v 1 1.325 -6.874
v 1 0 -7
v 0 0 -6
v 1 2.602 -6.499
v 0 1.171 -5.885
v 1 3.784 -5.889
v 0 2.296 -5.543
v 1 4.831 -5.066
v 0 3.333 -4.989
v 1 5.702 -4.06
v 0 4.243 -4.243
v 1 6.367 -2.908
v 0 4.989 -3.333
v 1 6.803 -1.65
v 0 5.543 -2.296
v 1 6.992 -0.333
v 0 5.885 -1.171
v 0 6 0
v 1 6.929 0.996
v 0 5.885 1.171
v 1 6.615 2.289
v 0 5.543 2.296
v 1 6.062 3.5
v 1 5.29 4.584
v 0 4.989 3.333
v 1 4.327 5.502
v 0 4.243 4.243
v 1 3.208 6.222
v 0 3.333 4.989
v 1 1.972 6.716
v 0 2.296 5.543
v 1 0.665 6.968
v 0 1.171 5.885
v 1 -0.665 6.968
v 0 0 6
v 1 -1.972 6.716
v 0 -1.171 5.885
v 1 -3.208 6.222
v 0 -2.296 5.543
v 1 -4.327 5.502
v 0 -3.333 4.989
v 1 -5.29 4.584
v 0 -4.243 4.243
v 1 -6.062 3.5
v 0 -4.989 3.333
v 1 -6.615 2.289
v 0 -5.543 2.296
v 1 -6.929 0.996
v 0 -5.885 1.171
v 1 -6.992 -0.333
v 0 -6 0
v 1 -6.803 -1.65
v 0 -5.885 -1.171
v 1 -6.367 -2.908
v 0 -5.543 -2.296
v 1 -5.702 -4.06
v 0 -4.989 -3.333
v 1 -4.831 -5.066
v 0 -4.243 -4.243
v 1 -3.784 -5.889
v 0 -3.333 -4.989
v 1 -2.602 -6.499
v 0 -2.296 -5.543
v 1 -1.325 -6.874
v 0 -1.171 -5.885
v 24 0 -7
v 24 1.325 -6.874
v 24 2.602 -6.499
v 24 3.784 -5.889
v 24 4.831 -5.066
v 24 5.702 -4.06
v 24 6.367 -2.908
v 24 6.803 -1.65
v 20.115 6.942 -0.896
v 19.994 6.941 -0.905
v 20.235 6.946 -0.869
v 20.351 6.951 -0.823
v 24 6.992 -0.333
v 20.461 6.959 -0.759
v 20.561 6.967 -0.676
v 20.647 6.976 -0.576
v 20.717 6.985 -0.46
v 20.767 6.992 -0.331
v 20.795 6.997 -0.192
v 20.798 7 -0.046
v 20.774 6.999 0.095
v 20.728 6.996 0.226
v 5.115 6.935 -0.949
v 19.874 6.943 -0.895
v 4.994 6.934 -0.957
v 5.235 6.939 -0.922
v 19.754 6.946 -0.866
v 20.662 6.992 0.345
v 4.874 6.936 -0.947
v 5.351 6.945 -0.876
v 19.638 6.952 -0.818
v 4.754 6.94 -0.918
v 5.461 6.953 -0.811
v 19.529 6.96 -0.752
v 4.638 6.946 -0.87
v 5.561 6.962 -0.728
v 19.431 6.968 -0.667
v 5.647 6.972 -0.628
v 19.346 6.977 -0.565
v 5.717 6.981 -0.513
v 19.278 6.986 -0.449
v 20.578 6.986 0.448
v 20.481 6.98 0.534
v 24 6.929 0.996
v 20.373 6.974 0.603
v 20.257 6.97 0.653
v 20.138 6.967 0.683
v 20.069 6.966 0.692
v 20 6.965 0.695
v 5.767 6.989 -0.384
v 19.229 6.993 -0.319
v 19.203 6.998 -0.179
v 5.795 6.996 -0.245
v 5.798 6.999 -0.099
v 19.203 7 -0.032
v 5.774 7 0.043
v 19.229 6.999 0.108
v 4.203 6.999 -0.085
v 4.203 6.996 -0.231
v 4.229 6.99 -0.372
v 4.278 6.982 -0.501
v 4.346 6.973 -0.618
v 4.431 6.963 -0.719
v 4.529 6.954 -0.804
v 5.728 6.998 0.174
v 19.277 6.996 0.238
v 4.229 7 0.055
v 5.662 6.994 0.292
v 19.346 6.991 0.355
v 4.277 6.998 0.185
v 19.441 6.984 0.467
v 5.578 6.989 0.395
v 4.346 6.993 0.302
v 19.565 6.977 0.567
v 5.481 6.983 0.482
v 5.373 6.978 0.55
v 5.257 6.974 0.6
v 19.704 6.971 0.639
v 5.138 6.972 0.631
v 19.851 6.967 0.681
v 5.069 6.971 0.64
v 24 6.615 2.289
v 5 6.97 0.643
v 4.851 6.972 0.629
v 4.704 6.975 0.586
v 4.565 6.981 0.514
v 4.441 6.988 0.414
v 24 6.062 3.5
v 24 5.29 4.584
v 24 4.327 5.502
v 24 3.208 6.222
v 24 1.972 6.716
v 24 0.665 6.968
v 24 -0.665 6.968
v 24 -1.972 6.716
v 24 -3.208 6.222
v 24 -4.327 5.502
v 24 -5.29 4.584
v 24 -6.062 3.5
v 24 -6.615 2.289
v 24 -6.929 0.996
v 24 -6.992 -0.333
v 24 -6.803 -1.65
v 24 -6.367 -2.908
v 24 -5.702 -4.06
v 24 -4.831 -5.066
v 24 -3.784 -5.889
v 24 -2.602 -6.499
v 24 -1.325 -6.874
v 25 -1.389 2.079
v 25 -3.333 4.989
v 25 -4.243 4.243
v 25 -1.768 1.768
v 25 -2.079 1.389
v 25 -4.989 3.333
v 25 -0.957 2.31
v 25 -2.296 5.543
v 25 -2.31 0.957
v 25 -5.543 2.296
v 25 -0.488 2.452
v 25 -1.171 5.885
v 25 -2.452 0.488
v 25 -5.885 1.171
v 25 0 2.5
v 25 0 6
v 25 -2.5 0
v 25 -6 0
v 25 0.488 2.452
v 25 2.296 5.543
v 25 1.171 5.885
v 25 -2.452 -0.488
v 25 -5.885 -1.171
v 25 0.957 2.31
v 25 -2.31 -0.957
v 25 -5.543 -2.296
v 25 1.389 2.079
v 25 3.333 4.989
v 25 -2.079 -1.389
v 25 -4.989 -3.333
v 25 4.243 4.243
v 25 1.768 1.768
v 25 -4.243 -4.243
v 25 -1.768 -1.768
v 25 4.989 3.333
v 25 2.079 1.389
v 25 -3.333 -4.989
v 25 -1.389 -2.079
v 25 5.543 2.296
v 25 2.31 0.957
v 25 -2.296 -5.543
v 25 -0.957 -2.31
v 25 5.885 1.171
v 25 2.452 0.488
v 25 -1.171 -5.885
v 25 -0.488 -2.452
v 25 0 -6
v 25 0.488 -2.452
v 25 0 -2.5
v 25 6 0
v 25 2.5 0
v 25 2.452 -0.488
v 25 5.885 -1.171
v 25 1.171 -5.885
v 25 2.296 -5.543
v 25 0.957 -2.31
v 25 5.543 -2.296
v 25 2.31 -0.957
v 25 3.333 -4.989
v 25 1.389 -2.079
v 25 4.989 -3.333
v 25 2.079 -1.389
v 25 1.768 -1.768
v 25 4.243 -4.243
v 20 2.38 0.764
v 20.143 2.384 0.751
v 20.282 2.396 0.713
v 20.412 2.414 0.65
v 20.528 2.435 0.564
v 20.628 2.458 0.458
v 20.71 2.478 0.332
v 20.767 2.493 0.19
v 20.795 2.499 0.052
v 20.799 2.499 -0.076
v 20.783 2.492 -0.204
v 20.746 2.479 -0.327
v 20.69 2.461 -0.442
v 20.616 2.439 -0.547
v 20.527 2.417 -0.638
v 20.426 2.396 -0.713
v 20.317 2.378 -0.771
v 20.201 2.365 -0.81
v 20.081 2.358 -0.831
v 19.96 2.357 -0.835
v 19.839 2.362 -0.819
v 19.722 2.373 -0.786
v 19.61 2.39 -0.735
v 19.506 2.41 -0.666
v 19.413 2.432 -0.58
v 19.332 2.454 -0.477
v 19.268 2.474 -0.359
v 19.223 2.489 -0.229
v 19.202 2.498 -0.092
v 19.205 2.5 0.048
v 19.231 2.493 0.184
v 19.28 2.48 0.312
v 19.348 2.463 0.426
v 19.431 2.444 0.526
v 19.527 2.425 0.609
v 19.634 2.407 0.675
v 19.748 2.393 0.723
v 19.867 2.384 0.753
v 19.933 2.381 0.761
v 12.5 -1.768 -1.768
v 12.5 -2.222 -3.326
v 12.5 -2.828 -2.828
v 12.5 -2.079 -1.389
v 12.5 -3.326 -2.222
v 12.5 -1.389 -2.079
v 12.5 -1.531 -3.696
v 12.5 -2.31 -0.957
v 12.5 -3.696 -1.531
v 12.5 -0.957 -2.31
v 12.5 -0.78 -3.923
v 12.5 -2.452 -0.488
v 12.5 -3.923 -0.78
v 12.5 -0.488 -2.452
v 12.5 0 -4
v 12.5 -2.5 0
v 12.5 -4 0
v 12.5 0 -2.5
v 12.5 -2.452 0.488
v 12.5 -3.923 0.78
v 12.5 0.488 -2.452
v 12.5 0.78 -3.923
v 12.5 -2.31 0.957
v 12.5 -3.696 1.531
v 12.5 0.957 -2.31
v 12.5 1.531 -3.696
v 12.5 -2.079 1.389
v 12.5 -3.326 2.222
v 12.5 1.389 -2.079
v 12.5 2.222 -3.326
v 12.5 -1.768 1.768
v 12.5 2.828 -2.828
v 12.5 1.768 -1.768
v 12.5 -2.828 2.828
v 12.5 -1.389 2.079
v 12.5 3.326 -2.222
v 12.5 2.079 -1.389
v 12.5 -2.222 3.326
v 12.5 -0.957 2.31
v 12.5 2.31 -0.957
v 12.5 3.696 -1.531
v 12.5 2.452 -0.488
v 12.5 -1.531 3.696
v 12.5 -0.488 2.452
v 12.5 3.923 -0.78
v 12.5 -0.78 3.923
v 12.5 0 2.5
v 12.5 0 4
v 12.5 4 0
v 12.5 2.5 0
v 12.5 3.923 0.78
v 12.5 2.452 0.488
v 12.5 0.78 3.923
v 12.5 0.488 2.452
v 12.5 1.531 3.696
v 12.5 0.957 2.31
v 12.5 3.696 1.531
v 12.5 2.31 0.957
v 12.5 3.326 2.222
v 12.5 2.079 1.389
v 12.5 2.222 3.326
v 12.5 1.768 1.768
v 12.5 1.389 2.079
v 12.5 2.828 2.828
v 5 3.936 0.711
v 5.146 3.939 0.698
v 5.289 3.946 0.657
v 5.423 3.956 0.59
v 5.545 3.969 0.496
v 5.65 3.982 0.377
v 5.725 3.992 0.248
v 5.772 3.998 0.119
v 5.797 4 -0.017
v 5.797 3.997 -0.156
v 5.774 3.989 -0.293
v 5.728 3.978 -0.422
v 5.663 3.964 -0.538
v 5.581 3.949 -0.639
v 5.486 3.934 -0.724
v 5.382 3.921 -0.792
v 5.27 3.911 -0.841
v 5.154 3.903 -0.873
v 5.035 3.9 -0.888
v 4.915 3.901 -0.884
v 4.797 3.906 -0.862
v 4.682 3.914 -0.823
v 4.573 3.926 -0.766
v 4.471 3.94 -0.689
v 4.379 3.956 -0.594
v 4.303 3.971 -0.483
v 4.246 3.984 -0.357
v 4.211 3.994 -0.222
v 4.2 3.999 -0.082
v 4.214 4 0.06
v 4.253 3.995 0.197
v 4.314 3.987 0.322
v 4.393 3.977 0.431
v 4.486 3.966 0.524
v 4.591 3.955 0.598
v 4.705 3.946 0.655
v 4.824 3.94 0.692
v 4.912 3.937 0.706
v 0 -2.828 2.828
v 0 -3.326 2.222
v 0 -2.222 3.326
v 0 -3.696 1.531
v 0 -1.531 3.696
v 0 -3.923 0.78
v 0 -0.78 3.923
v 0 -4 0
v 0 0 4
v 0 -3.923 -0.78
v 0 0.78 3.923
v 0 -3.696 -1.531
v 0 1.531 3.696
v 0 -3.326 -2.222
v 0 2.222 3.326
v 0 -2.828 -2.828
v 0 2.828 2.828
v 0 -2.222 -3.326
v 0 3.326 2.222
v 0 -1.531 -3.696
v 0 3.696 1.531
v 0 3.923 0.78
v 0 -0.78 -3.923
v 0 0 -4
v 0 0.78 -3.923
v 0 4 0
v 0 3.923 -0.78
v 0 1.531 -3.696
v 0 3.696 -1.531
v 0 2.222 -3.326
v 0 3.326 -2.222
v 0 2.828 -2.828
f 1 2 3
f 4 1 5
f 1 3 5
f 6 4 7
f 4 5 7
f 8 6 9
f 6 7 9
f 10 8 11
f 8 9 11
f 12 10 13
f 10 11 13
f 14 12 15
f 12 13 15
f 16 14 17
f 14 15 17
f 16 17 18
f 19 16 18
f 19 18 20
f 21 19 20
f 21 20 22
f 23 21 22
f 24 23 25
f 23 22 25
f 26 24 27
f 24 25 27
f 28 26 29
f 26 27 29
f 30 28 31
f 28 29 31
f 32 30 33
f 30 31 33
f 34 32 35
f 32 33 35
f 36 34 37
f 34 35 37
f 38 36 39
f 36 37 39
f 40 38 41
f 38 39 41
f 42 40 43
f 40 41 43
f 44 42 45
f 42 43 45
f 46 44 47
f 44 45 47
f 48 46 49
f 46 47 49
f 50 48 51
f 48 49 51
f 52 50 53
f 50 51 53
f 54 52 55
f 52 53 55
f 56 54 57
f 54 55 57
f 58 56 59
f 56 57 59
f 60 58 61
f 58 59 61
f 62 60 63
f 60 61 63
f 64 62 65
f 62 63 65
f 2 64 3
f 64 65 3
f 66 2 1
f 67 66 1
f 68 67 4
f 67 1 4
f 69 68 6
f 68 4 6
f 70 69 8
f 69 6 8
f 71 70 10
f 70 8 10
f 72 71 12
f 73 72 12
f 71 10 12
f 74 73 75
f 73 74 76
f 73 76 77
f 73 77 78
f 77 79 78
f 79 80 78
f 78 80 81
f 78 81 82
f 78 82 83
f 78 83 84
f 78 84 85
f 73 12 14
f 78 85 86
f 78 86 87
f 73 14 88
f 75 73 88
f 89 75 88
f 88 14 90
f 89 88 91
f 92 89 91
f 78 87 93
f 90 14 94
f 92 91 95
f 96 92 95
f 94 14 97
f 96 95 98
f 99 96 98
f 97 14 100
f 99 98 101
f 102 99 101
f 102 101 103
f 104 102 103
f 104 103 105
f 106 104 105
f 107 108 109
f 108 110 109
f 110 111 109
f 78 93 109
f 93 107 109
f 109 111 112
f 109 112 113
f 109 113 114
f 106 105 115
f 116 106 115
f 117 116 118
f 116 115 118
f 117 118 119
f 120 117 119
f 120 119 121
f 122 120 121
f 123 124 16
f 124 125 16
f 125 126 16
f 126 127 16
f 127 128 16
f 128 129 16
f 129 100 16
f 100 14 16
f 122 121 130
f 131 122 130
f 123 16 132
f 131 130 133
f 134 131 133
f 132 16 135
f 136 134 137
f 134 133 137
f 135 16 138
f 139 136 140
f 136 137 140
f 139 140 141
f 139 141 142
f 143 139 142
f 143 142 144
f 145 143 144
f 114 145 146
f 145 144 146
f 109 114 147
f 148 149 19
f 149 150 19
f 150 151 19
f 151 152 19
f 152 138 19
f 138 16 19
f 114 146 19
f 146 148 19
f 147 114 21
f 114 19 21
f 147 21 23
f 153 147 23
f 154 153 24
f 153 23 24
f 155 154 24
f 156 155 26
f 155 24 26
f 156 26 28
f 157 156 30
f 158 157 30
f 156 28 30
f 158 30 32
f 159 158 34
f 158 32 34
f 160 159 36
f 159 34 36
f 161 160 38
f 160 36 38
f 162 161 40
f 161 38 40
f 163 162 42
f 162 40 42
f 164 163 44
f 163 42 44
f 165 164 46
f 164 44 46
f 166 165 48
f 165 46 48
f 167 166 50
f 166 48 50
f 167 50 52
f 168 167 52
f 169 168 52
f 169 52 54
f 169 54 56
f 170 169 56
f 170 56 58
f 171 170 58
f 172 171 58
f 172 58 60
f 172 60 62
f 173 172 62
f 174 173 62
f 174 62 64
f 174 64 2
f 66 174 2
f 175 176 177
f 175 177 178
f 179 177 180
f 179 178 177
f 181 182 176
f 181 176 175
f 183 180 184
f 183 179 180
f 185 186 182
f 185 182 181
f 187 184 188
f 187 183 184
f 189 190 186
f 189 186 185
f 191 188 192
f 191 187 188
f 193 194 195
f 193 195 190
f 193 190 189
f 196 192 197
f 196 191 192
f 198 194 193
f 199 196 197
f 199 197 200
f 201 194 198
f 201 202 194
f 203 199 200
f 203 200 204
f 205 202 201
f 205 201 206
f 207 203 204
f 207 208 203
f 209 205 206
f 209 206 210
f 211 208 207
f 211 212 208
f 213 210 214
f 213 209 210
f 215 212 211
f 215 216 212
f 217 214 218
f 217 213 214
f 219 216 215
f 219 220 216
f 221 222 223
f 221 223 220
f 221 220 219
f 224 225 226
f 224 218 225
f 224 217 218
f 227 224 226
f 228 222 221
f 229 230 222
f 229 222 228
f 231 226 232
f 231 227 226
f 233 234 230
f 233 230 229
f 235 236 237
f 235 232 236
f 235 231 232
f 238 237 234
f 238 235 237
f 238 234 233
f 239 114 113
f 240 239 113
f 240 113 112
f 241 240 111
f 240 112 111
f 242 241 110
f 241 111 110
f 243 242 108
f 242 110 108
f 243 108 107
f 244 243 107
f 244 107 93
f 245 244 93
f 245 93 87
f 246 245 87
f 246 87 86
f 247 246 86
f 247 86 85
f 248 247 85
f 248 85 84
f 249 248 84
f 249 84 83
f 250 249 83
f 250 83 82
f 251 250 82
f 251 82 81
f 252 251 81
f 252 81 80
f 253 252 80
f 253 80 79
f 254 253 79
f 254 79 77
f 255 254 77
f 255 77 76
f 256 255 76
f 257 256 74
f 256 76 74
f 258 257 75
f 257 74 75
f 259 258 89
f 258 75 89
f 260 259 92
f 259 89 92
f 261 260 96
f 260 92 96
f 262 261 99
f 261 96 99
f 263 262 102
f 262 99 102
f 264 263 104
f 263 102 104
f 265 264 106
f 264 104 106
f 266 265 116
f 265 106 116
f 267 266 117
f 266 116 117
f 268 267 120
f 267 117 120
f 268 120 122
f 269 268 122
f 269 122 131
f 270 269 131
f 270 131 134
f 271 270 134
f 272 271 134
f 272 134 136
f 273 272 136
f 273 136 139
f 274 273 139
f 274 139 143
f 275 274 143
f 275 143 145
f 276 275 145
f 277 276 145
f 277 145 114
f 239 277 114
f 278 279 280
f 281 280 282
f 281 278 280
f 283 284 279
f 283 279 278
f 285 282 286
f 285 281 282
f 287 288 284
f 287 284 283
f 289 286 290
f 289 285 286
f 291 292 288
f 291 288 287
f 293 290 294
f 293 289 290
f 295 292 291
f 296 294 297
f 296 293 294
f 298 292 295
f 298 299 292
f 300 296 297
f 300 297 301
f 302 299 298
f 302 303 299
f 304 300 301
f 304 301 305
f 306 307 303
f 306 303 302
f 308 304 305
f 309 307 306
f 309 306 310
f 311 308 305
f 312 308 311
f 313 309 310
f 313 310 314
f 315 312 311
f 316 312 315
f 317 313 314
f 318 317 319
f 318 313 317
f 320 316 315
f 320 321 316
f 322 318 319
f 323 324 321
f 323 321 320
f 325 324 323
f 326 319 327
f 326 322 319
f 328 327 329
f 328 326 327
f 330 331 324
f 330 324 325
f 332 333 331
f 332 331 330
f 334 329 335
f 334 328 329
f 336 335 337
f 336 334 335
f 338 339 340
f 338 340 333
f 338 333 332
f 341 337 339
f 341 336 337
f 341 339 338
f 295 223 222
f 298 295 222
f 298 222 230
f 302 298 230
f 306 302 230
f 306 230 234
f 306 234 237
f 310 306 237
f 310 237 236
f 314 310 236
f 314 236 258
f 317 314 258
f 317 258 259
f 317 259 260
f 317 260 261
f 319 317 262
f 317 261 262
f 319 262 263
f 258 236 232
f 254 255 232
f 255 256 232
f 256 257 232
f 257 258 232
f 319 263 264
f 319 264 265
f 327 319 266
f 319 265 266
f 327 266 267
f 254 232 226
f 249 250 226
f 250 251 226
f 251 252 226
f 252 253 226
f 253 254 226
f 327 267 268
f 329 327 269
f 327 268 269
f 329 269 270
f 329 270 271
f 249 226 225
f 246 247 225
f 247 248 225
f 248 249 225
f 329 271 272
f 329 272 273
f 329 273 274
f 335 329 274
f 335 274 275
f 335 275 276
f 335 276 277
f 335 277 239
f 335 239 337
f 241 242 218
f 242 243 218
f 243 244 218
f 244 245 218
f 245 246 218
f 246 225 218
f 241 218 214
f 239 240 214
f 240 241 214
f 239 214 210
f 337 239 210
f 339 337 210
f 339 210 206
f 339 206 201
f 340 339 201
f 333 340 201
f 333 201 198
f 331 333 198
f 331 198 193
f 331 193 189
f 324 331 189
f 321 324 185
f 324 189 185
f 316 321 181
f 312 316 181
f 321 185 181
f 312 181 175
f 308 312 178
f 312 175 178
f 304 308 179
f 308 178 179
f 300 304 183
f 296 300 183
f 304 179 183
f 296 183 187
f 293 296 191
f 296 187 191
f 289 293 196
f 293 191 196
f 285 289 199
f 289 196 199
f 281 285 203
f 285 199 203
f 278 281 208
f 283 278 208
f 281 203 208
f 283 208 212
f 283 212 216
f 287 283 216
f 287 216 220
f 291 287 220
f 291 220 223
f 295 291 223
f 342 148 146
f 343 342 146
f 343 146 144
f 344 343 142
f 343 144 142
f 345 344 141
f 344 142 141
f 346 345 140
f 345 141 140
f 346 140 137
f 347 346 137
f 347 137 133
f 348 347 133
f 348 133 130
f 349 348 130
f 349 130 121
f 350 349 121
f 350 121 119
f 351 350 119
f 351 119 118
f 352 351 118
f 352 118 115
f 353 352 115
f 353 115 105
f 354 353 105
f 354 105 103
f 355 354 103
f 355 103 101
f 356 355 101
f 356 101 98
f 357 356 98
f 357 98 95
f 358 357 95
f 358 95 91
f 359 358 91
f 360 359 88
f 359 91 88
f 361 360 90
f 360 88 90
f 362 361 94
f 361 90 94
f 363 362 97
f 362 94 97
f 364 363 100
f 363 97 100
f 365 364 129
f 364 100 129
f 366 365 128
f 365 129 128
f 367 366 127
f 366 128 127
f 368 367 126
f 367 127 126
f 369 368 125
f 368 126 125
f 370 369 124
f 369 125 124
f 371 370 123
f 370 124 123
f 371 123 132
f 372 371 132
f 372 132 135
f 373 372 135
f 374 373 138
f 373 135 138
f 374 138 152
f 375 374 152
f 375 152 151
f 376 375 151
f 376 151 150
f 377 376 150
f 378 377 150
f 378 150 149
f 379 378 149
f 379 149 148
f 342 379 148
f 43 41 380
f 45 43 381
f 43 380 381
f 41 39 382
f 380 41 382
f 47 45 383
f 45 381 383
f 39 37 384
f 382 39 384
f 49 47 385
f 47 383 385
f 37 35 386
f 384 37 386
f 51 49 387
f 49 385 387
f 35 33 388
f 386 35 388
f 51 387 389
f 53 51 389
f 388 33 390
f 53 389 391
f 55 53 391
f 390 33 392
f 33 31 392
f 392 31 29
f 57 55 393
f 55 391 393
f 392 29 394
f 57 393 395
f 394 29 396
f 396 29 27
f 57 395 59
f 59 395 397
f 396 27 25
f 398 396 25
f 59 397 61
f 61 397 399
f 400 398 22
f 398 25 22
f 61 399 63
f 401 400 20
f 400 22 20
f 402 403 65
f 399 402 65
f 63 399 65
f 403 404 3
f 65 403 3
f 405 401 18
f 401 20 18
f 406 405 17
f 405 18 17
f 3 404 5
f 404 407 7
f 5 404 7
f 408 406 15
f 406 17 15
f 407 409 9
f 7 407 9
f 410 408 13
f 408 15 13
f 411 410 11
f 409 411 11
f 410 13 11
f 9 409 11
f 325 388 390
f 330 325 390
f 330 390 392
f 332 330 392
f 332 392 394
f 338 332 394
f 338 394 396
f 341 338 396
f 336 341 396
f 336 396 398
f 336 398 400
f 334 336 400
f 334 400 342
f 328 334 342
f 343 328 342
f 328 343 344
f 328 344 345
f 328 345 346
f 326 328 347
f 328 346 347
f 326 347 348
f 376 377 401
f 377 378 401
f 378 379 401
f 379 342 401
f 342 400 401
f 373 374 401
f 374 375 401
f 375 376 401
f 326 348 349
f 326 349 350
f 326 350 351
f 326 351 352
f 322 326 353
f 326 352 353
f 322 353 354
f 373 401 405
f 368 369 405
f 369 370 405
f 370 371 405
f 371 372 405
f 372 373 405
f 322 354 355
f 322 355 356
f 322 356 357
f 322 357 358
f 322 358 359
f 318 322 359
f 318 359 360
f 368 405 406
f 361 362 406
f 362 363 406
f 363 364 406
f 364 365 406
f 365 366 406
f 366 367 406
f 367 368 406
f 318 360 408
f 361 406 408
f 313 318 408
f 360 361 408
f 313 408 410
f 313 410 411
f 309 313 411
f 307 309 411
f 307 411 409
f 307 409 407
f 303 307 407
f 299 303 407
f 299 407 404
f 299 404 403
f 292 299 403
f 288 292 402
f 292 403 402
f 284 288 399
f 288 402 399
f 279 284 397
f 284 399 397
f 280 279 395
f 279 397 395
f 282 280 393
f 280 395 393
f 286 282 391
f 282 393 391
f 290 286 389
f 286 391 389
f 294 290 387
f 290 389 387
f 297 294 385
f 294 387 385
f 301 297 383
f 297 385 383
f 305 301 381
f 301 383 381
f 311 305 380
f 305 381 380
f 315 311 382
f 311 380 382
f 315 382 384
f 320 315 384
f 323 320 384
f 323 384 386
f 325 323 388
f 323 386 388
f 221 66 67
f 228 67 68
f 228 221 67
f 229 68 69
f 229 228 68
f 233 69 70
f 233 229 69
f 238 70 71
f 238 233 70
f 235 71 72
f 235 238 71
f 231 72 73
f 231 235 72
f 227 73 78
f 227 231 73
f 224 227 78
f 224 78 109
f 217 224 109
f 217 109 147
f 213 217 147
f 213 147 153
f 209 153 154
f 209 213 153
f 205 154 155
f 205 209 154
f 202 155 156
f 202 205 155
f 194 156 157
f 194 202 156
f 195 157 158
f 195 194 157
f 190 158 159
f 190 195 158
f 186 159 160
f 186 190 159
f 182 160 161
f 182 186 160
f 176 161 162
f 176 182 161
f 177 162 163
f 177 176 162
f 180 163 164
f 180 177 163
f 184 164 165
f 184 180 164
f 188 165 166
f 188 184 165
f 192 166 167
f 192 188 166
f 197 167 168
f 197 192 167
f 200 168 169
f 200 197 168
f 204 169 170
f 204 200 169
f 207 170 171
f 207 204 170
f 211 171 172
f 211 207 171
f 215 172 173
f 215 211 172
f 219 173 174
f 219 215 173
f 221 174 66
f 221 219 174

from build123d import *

# Parameters (mm, degrees)
CROQUIS1_R                          = 7
SALIENTE_EXTRUIR1_DEPTH             = 25
CROQUIS2_R                          = 2.5
CORTAR_EXTRUIR1_DEPTH               = 12.5
CROQUIS3_R                          = 4
CORTAR_EXTRUIR2_DEPTH               = 12.5
CHAFL_N1_SIZE                       = 1
CHAFL_N2_SIZE                       = 1
TALADRO_DE_MARGEN_PARA_M1_41_REACH  = 27.44
TALADRO_DE_MARGEN_PARA_M1_41_BORE_R = 0.8
TALADRO_DE_MARGEN_PARA_M1_42_REACH  = 27.426
TALADRO_DE_MARGEN_PARA_M1_42_BORE_R = 0.8


with BuildPart() as part:
    # Croquis1 → Saliente-Extruir1 (new body)
    with BuildSketch(Plane(origin=(0, 0, 0), x_dir=(0, 0, -1), z_dir=(1, 0, 0))):
        Circle(CROQUIS1_R)
    extrude(amount=SALIENTE_EXTRUIR1_DEPTH)

    # Croquis2 → Cortar-Extruir1 (cut)
    with BuildSketch(Plane(origin=(25, 0, 0), x_dir=(0, 0, -1), z_dir=(1, 0, 0))):
        Circle(CROQUIS2_R)
    extrude(amount=-CORTAR_EXTRUIR1_DEPTH, mode=Mode.SUBTRACT)

    # Croquis3 → Cortar-Extruir2 (cut)
    with BuildSketch(Plane.ZY):
        Circle(CROQUIS3_R)
    extrude(amount=-CORTAR_EXTRUIR2_DEPTH, mode=Mode.SUBTRACT)

    # Chaflán1
    chafl_n1_edges = [part.edges().sort_by_distance(p)[0] for p in [
        (25, 0, 7),
    ]]
    chamfer(chafl_n1_edges, length=CHAFL_N1_SIZE)

    # Chaflán2
    chafl_n2_edges = [part.edges().sort_by_distance(p)[0] for p in [
        (0, 0, 7),
    ]]
    chamfer(chafl_n2_edges, length=CHAFL_N2_SIZE)

    # Taladro de margen para M1.41 bore (on position points) → Taladro de margen para M1.41 (cut, up to next)
    with BuildSketch(Plane(origin=(5, 6.998215778, -0.158037721), x_dir=(0, 0.022576817235, 0.999745111178), z_dir=(0, 0.999745111178, -0.022576817235)), mode=Mode.PRIVATE) as taladro_de_margen_para_m1_41_sk1:
        Circle(TALADRO_DE_MARGEN_PARA_M1_41_BORE_R)
    taladro_de_margen_para_m1_41_tool1 = extrude(taladro_de_margen_para_m1_41_sk1.sketch, amount=-TALADRO_DE_MARGEN_PARA_M1_41_REACH, mode=Mode.PRIVATE) & part.part
    add(taladro_de_margen_para_m1_41_tool1.solids().sort_by_distance((5, 6.998216, -0.158038))[0], mode=Mode.SUBTRACT)

    # Taladro de margen para M1.42 bore (on position points) → Taladro de margen para M1.42 (cut, up to next)
    with BuildSketch(Plane(origin=(20, 6.999207069, -0.10535848), x_dir=(0, 0.01505121149, 0.999886724101), z_dir=(0, 0.999886724101, -0.01505121149)), mode=Mode.PRIVATE) as taladro_de_margen_para_m1_42_sk1:
        Circle(TALADRO_DE_MARGEN_PARA_M1_42_BORE_R)
    taladro_de_margen_para_m1_42_tool1 = extrude(taladro_de_margen_para_m1_42_sk1.sketch, amount=-TALADRO_DE_MARGEN_PARA_M1_42_REACH, mode=Mode.PRIVATE) & part.part
    add(taladro_de_margen_para_m1_42_tool1.solids().sort_by_distance((20, 6.999207, -0.105358))[0], mode=Mode.SUBTRACT)


solid = part.part
